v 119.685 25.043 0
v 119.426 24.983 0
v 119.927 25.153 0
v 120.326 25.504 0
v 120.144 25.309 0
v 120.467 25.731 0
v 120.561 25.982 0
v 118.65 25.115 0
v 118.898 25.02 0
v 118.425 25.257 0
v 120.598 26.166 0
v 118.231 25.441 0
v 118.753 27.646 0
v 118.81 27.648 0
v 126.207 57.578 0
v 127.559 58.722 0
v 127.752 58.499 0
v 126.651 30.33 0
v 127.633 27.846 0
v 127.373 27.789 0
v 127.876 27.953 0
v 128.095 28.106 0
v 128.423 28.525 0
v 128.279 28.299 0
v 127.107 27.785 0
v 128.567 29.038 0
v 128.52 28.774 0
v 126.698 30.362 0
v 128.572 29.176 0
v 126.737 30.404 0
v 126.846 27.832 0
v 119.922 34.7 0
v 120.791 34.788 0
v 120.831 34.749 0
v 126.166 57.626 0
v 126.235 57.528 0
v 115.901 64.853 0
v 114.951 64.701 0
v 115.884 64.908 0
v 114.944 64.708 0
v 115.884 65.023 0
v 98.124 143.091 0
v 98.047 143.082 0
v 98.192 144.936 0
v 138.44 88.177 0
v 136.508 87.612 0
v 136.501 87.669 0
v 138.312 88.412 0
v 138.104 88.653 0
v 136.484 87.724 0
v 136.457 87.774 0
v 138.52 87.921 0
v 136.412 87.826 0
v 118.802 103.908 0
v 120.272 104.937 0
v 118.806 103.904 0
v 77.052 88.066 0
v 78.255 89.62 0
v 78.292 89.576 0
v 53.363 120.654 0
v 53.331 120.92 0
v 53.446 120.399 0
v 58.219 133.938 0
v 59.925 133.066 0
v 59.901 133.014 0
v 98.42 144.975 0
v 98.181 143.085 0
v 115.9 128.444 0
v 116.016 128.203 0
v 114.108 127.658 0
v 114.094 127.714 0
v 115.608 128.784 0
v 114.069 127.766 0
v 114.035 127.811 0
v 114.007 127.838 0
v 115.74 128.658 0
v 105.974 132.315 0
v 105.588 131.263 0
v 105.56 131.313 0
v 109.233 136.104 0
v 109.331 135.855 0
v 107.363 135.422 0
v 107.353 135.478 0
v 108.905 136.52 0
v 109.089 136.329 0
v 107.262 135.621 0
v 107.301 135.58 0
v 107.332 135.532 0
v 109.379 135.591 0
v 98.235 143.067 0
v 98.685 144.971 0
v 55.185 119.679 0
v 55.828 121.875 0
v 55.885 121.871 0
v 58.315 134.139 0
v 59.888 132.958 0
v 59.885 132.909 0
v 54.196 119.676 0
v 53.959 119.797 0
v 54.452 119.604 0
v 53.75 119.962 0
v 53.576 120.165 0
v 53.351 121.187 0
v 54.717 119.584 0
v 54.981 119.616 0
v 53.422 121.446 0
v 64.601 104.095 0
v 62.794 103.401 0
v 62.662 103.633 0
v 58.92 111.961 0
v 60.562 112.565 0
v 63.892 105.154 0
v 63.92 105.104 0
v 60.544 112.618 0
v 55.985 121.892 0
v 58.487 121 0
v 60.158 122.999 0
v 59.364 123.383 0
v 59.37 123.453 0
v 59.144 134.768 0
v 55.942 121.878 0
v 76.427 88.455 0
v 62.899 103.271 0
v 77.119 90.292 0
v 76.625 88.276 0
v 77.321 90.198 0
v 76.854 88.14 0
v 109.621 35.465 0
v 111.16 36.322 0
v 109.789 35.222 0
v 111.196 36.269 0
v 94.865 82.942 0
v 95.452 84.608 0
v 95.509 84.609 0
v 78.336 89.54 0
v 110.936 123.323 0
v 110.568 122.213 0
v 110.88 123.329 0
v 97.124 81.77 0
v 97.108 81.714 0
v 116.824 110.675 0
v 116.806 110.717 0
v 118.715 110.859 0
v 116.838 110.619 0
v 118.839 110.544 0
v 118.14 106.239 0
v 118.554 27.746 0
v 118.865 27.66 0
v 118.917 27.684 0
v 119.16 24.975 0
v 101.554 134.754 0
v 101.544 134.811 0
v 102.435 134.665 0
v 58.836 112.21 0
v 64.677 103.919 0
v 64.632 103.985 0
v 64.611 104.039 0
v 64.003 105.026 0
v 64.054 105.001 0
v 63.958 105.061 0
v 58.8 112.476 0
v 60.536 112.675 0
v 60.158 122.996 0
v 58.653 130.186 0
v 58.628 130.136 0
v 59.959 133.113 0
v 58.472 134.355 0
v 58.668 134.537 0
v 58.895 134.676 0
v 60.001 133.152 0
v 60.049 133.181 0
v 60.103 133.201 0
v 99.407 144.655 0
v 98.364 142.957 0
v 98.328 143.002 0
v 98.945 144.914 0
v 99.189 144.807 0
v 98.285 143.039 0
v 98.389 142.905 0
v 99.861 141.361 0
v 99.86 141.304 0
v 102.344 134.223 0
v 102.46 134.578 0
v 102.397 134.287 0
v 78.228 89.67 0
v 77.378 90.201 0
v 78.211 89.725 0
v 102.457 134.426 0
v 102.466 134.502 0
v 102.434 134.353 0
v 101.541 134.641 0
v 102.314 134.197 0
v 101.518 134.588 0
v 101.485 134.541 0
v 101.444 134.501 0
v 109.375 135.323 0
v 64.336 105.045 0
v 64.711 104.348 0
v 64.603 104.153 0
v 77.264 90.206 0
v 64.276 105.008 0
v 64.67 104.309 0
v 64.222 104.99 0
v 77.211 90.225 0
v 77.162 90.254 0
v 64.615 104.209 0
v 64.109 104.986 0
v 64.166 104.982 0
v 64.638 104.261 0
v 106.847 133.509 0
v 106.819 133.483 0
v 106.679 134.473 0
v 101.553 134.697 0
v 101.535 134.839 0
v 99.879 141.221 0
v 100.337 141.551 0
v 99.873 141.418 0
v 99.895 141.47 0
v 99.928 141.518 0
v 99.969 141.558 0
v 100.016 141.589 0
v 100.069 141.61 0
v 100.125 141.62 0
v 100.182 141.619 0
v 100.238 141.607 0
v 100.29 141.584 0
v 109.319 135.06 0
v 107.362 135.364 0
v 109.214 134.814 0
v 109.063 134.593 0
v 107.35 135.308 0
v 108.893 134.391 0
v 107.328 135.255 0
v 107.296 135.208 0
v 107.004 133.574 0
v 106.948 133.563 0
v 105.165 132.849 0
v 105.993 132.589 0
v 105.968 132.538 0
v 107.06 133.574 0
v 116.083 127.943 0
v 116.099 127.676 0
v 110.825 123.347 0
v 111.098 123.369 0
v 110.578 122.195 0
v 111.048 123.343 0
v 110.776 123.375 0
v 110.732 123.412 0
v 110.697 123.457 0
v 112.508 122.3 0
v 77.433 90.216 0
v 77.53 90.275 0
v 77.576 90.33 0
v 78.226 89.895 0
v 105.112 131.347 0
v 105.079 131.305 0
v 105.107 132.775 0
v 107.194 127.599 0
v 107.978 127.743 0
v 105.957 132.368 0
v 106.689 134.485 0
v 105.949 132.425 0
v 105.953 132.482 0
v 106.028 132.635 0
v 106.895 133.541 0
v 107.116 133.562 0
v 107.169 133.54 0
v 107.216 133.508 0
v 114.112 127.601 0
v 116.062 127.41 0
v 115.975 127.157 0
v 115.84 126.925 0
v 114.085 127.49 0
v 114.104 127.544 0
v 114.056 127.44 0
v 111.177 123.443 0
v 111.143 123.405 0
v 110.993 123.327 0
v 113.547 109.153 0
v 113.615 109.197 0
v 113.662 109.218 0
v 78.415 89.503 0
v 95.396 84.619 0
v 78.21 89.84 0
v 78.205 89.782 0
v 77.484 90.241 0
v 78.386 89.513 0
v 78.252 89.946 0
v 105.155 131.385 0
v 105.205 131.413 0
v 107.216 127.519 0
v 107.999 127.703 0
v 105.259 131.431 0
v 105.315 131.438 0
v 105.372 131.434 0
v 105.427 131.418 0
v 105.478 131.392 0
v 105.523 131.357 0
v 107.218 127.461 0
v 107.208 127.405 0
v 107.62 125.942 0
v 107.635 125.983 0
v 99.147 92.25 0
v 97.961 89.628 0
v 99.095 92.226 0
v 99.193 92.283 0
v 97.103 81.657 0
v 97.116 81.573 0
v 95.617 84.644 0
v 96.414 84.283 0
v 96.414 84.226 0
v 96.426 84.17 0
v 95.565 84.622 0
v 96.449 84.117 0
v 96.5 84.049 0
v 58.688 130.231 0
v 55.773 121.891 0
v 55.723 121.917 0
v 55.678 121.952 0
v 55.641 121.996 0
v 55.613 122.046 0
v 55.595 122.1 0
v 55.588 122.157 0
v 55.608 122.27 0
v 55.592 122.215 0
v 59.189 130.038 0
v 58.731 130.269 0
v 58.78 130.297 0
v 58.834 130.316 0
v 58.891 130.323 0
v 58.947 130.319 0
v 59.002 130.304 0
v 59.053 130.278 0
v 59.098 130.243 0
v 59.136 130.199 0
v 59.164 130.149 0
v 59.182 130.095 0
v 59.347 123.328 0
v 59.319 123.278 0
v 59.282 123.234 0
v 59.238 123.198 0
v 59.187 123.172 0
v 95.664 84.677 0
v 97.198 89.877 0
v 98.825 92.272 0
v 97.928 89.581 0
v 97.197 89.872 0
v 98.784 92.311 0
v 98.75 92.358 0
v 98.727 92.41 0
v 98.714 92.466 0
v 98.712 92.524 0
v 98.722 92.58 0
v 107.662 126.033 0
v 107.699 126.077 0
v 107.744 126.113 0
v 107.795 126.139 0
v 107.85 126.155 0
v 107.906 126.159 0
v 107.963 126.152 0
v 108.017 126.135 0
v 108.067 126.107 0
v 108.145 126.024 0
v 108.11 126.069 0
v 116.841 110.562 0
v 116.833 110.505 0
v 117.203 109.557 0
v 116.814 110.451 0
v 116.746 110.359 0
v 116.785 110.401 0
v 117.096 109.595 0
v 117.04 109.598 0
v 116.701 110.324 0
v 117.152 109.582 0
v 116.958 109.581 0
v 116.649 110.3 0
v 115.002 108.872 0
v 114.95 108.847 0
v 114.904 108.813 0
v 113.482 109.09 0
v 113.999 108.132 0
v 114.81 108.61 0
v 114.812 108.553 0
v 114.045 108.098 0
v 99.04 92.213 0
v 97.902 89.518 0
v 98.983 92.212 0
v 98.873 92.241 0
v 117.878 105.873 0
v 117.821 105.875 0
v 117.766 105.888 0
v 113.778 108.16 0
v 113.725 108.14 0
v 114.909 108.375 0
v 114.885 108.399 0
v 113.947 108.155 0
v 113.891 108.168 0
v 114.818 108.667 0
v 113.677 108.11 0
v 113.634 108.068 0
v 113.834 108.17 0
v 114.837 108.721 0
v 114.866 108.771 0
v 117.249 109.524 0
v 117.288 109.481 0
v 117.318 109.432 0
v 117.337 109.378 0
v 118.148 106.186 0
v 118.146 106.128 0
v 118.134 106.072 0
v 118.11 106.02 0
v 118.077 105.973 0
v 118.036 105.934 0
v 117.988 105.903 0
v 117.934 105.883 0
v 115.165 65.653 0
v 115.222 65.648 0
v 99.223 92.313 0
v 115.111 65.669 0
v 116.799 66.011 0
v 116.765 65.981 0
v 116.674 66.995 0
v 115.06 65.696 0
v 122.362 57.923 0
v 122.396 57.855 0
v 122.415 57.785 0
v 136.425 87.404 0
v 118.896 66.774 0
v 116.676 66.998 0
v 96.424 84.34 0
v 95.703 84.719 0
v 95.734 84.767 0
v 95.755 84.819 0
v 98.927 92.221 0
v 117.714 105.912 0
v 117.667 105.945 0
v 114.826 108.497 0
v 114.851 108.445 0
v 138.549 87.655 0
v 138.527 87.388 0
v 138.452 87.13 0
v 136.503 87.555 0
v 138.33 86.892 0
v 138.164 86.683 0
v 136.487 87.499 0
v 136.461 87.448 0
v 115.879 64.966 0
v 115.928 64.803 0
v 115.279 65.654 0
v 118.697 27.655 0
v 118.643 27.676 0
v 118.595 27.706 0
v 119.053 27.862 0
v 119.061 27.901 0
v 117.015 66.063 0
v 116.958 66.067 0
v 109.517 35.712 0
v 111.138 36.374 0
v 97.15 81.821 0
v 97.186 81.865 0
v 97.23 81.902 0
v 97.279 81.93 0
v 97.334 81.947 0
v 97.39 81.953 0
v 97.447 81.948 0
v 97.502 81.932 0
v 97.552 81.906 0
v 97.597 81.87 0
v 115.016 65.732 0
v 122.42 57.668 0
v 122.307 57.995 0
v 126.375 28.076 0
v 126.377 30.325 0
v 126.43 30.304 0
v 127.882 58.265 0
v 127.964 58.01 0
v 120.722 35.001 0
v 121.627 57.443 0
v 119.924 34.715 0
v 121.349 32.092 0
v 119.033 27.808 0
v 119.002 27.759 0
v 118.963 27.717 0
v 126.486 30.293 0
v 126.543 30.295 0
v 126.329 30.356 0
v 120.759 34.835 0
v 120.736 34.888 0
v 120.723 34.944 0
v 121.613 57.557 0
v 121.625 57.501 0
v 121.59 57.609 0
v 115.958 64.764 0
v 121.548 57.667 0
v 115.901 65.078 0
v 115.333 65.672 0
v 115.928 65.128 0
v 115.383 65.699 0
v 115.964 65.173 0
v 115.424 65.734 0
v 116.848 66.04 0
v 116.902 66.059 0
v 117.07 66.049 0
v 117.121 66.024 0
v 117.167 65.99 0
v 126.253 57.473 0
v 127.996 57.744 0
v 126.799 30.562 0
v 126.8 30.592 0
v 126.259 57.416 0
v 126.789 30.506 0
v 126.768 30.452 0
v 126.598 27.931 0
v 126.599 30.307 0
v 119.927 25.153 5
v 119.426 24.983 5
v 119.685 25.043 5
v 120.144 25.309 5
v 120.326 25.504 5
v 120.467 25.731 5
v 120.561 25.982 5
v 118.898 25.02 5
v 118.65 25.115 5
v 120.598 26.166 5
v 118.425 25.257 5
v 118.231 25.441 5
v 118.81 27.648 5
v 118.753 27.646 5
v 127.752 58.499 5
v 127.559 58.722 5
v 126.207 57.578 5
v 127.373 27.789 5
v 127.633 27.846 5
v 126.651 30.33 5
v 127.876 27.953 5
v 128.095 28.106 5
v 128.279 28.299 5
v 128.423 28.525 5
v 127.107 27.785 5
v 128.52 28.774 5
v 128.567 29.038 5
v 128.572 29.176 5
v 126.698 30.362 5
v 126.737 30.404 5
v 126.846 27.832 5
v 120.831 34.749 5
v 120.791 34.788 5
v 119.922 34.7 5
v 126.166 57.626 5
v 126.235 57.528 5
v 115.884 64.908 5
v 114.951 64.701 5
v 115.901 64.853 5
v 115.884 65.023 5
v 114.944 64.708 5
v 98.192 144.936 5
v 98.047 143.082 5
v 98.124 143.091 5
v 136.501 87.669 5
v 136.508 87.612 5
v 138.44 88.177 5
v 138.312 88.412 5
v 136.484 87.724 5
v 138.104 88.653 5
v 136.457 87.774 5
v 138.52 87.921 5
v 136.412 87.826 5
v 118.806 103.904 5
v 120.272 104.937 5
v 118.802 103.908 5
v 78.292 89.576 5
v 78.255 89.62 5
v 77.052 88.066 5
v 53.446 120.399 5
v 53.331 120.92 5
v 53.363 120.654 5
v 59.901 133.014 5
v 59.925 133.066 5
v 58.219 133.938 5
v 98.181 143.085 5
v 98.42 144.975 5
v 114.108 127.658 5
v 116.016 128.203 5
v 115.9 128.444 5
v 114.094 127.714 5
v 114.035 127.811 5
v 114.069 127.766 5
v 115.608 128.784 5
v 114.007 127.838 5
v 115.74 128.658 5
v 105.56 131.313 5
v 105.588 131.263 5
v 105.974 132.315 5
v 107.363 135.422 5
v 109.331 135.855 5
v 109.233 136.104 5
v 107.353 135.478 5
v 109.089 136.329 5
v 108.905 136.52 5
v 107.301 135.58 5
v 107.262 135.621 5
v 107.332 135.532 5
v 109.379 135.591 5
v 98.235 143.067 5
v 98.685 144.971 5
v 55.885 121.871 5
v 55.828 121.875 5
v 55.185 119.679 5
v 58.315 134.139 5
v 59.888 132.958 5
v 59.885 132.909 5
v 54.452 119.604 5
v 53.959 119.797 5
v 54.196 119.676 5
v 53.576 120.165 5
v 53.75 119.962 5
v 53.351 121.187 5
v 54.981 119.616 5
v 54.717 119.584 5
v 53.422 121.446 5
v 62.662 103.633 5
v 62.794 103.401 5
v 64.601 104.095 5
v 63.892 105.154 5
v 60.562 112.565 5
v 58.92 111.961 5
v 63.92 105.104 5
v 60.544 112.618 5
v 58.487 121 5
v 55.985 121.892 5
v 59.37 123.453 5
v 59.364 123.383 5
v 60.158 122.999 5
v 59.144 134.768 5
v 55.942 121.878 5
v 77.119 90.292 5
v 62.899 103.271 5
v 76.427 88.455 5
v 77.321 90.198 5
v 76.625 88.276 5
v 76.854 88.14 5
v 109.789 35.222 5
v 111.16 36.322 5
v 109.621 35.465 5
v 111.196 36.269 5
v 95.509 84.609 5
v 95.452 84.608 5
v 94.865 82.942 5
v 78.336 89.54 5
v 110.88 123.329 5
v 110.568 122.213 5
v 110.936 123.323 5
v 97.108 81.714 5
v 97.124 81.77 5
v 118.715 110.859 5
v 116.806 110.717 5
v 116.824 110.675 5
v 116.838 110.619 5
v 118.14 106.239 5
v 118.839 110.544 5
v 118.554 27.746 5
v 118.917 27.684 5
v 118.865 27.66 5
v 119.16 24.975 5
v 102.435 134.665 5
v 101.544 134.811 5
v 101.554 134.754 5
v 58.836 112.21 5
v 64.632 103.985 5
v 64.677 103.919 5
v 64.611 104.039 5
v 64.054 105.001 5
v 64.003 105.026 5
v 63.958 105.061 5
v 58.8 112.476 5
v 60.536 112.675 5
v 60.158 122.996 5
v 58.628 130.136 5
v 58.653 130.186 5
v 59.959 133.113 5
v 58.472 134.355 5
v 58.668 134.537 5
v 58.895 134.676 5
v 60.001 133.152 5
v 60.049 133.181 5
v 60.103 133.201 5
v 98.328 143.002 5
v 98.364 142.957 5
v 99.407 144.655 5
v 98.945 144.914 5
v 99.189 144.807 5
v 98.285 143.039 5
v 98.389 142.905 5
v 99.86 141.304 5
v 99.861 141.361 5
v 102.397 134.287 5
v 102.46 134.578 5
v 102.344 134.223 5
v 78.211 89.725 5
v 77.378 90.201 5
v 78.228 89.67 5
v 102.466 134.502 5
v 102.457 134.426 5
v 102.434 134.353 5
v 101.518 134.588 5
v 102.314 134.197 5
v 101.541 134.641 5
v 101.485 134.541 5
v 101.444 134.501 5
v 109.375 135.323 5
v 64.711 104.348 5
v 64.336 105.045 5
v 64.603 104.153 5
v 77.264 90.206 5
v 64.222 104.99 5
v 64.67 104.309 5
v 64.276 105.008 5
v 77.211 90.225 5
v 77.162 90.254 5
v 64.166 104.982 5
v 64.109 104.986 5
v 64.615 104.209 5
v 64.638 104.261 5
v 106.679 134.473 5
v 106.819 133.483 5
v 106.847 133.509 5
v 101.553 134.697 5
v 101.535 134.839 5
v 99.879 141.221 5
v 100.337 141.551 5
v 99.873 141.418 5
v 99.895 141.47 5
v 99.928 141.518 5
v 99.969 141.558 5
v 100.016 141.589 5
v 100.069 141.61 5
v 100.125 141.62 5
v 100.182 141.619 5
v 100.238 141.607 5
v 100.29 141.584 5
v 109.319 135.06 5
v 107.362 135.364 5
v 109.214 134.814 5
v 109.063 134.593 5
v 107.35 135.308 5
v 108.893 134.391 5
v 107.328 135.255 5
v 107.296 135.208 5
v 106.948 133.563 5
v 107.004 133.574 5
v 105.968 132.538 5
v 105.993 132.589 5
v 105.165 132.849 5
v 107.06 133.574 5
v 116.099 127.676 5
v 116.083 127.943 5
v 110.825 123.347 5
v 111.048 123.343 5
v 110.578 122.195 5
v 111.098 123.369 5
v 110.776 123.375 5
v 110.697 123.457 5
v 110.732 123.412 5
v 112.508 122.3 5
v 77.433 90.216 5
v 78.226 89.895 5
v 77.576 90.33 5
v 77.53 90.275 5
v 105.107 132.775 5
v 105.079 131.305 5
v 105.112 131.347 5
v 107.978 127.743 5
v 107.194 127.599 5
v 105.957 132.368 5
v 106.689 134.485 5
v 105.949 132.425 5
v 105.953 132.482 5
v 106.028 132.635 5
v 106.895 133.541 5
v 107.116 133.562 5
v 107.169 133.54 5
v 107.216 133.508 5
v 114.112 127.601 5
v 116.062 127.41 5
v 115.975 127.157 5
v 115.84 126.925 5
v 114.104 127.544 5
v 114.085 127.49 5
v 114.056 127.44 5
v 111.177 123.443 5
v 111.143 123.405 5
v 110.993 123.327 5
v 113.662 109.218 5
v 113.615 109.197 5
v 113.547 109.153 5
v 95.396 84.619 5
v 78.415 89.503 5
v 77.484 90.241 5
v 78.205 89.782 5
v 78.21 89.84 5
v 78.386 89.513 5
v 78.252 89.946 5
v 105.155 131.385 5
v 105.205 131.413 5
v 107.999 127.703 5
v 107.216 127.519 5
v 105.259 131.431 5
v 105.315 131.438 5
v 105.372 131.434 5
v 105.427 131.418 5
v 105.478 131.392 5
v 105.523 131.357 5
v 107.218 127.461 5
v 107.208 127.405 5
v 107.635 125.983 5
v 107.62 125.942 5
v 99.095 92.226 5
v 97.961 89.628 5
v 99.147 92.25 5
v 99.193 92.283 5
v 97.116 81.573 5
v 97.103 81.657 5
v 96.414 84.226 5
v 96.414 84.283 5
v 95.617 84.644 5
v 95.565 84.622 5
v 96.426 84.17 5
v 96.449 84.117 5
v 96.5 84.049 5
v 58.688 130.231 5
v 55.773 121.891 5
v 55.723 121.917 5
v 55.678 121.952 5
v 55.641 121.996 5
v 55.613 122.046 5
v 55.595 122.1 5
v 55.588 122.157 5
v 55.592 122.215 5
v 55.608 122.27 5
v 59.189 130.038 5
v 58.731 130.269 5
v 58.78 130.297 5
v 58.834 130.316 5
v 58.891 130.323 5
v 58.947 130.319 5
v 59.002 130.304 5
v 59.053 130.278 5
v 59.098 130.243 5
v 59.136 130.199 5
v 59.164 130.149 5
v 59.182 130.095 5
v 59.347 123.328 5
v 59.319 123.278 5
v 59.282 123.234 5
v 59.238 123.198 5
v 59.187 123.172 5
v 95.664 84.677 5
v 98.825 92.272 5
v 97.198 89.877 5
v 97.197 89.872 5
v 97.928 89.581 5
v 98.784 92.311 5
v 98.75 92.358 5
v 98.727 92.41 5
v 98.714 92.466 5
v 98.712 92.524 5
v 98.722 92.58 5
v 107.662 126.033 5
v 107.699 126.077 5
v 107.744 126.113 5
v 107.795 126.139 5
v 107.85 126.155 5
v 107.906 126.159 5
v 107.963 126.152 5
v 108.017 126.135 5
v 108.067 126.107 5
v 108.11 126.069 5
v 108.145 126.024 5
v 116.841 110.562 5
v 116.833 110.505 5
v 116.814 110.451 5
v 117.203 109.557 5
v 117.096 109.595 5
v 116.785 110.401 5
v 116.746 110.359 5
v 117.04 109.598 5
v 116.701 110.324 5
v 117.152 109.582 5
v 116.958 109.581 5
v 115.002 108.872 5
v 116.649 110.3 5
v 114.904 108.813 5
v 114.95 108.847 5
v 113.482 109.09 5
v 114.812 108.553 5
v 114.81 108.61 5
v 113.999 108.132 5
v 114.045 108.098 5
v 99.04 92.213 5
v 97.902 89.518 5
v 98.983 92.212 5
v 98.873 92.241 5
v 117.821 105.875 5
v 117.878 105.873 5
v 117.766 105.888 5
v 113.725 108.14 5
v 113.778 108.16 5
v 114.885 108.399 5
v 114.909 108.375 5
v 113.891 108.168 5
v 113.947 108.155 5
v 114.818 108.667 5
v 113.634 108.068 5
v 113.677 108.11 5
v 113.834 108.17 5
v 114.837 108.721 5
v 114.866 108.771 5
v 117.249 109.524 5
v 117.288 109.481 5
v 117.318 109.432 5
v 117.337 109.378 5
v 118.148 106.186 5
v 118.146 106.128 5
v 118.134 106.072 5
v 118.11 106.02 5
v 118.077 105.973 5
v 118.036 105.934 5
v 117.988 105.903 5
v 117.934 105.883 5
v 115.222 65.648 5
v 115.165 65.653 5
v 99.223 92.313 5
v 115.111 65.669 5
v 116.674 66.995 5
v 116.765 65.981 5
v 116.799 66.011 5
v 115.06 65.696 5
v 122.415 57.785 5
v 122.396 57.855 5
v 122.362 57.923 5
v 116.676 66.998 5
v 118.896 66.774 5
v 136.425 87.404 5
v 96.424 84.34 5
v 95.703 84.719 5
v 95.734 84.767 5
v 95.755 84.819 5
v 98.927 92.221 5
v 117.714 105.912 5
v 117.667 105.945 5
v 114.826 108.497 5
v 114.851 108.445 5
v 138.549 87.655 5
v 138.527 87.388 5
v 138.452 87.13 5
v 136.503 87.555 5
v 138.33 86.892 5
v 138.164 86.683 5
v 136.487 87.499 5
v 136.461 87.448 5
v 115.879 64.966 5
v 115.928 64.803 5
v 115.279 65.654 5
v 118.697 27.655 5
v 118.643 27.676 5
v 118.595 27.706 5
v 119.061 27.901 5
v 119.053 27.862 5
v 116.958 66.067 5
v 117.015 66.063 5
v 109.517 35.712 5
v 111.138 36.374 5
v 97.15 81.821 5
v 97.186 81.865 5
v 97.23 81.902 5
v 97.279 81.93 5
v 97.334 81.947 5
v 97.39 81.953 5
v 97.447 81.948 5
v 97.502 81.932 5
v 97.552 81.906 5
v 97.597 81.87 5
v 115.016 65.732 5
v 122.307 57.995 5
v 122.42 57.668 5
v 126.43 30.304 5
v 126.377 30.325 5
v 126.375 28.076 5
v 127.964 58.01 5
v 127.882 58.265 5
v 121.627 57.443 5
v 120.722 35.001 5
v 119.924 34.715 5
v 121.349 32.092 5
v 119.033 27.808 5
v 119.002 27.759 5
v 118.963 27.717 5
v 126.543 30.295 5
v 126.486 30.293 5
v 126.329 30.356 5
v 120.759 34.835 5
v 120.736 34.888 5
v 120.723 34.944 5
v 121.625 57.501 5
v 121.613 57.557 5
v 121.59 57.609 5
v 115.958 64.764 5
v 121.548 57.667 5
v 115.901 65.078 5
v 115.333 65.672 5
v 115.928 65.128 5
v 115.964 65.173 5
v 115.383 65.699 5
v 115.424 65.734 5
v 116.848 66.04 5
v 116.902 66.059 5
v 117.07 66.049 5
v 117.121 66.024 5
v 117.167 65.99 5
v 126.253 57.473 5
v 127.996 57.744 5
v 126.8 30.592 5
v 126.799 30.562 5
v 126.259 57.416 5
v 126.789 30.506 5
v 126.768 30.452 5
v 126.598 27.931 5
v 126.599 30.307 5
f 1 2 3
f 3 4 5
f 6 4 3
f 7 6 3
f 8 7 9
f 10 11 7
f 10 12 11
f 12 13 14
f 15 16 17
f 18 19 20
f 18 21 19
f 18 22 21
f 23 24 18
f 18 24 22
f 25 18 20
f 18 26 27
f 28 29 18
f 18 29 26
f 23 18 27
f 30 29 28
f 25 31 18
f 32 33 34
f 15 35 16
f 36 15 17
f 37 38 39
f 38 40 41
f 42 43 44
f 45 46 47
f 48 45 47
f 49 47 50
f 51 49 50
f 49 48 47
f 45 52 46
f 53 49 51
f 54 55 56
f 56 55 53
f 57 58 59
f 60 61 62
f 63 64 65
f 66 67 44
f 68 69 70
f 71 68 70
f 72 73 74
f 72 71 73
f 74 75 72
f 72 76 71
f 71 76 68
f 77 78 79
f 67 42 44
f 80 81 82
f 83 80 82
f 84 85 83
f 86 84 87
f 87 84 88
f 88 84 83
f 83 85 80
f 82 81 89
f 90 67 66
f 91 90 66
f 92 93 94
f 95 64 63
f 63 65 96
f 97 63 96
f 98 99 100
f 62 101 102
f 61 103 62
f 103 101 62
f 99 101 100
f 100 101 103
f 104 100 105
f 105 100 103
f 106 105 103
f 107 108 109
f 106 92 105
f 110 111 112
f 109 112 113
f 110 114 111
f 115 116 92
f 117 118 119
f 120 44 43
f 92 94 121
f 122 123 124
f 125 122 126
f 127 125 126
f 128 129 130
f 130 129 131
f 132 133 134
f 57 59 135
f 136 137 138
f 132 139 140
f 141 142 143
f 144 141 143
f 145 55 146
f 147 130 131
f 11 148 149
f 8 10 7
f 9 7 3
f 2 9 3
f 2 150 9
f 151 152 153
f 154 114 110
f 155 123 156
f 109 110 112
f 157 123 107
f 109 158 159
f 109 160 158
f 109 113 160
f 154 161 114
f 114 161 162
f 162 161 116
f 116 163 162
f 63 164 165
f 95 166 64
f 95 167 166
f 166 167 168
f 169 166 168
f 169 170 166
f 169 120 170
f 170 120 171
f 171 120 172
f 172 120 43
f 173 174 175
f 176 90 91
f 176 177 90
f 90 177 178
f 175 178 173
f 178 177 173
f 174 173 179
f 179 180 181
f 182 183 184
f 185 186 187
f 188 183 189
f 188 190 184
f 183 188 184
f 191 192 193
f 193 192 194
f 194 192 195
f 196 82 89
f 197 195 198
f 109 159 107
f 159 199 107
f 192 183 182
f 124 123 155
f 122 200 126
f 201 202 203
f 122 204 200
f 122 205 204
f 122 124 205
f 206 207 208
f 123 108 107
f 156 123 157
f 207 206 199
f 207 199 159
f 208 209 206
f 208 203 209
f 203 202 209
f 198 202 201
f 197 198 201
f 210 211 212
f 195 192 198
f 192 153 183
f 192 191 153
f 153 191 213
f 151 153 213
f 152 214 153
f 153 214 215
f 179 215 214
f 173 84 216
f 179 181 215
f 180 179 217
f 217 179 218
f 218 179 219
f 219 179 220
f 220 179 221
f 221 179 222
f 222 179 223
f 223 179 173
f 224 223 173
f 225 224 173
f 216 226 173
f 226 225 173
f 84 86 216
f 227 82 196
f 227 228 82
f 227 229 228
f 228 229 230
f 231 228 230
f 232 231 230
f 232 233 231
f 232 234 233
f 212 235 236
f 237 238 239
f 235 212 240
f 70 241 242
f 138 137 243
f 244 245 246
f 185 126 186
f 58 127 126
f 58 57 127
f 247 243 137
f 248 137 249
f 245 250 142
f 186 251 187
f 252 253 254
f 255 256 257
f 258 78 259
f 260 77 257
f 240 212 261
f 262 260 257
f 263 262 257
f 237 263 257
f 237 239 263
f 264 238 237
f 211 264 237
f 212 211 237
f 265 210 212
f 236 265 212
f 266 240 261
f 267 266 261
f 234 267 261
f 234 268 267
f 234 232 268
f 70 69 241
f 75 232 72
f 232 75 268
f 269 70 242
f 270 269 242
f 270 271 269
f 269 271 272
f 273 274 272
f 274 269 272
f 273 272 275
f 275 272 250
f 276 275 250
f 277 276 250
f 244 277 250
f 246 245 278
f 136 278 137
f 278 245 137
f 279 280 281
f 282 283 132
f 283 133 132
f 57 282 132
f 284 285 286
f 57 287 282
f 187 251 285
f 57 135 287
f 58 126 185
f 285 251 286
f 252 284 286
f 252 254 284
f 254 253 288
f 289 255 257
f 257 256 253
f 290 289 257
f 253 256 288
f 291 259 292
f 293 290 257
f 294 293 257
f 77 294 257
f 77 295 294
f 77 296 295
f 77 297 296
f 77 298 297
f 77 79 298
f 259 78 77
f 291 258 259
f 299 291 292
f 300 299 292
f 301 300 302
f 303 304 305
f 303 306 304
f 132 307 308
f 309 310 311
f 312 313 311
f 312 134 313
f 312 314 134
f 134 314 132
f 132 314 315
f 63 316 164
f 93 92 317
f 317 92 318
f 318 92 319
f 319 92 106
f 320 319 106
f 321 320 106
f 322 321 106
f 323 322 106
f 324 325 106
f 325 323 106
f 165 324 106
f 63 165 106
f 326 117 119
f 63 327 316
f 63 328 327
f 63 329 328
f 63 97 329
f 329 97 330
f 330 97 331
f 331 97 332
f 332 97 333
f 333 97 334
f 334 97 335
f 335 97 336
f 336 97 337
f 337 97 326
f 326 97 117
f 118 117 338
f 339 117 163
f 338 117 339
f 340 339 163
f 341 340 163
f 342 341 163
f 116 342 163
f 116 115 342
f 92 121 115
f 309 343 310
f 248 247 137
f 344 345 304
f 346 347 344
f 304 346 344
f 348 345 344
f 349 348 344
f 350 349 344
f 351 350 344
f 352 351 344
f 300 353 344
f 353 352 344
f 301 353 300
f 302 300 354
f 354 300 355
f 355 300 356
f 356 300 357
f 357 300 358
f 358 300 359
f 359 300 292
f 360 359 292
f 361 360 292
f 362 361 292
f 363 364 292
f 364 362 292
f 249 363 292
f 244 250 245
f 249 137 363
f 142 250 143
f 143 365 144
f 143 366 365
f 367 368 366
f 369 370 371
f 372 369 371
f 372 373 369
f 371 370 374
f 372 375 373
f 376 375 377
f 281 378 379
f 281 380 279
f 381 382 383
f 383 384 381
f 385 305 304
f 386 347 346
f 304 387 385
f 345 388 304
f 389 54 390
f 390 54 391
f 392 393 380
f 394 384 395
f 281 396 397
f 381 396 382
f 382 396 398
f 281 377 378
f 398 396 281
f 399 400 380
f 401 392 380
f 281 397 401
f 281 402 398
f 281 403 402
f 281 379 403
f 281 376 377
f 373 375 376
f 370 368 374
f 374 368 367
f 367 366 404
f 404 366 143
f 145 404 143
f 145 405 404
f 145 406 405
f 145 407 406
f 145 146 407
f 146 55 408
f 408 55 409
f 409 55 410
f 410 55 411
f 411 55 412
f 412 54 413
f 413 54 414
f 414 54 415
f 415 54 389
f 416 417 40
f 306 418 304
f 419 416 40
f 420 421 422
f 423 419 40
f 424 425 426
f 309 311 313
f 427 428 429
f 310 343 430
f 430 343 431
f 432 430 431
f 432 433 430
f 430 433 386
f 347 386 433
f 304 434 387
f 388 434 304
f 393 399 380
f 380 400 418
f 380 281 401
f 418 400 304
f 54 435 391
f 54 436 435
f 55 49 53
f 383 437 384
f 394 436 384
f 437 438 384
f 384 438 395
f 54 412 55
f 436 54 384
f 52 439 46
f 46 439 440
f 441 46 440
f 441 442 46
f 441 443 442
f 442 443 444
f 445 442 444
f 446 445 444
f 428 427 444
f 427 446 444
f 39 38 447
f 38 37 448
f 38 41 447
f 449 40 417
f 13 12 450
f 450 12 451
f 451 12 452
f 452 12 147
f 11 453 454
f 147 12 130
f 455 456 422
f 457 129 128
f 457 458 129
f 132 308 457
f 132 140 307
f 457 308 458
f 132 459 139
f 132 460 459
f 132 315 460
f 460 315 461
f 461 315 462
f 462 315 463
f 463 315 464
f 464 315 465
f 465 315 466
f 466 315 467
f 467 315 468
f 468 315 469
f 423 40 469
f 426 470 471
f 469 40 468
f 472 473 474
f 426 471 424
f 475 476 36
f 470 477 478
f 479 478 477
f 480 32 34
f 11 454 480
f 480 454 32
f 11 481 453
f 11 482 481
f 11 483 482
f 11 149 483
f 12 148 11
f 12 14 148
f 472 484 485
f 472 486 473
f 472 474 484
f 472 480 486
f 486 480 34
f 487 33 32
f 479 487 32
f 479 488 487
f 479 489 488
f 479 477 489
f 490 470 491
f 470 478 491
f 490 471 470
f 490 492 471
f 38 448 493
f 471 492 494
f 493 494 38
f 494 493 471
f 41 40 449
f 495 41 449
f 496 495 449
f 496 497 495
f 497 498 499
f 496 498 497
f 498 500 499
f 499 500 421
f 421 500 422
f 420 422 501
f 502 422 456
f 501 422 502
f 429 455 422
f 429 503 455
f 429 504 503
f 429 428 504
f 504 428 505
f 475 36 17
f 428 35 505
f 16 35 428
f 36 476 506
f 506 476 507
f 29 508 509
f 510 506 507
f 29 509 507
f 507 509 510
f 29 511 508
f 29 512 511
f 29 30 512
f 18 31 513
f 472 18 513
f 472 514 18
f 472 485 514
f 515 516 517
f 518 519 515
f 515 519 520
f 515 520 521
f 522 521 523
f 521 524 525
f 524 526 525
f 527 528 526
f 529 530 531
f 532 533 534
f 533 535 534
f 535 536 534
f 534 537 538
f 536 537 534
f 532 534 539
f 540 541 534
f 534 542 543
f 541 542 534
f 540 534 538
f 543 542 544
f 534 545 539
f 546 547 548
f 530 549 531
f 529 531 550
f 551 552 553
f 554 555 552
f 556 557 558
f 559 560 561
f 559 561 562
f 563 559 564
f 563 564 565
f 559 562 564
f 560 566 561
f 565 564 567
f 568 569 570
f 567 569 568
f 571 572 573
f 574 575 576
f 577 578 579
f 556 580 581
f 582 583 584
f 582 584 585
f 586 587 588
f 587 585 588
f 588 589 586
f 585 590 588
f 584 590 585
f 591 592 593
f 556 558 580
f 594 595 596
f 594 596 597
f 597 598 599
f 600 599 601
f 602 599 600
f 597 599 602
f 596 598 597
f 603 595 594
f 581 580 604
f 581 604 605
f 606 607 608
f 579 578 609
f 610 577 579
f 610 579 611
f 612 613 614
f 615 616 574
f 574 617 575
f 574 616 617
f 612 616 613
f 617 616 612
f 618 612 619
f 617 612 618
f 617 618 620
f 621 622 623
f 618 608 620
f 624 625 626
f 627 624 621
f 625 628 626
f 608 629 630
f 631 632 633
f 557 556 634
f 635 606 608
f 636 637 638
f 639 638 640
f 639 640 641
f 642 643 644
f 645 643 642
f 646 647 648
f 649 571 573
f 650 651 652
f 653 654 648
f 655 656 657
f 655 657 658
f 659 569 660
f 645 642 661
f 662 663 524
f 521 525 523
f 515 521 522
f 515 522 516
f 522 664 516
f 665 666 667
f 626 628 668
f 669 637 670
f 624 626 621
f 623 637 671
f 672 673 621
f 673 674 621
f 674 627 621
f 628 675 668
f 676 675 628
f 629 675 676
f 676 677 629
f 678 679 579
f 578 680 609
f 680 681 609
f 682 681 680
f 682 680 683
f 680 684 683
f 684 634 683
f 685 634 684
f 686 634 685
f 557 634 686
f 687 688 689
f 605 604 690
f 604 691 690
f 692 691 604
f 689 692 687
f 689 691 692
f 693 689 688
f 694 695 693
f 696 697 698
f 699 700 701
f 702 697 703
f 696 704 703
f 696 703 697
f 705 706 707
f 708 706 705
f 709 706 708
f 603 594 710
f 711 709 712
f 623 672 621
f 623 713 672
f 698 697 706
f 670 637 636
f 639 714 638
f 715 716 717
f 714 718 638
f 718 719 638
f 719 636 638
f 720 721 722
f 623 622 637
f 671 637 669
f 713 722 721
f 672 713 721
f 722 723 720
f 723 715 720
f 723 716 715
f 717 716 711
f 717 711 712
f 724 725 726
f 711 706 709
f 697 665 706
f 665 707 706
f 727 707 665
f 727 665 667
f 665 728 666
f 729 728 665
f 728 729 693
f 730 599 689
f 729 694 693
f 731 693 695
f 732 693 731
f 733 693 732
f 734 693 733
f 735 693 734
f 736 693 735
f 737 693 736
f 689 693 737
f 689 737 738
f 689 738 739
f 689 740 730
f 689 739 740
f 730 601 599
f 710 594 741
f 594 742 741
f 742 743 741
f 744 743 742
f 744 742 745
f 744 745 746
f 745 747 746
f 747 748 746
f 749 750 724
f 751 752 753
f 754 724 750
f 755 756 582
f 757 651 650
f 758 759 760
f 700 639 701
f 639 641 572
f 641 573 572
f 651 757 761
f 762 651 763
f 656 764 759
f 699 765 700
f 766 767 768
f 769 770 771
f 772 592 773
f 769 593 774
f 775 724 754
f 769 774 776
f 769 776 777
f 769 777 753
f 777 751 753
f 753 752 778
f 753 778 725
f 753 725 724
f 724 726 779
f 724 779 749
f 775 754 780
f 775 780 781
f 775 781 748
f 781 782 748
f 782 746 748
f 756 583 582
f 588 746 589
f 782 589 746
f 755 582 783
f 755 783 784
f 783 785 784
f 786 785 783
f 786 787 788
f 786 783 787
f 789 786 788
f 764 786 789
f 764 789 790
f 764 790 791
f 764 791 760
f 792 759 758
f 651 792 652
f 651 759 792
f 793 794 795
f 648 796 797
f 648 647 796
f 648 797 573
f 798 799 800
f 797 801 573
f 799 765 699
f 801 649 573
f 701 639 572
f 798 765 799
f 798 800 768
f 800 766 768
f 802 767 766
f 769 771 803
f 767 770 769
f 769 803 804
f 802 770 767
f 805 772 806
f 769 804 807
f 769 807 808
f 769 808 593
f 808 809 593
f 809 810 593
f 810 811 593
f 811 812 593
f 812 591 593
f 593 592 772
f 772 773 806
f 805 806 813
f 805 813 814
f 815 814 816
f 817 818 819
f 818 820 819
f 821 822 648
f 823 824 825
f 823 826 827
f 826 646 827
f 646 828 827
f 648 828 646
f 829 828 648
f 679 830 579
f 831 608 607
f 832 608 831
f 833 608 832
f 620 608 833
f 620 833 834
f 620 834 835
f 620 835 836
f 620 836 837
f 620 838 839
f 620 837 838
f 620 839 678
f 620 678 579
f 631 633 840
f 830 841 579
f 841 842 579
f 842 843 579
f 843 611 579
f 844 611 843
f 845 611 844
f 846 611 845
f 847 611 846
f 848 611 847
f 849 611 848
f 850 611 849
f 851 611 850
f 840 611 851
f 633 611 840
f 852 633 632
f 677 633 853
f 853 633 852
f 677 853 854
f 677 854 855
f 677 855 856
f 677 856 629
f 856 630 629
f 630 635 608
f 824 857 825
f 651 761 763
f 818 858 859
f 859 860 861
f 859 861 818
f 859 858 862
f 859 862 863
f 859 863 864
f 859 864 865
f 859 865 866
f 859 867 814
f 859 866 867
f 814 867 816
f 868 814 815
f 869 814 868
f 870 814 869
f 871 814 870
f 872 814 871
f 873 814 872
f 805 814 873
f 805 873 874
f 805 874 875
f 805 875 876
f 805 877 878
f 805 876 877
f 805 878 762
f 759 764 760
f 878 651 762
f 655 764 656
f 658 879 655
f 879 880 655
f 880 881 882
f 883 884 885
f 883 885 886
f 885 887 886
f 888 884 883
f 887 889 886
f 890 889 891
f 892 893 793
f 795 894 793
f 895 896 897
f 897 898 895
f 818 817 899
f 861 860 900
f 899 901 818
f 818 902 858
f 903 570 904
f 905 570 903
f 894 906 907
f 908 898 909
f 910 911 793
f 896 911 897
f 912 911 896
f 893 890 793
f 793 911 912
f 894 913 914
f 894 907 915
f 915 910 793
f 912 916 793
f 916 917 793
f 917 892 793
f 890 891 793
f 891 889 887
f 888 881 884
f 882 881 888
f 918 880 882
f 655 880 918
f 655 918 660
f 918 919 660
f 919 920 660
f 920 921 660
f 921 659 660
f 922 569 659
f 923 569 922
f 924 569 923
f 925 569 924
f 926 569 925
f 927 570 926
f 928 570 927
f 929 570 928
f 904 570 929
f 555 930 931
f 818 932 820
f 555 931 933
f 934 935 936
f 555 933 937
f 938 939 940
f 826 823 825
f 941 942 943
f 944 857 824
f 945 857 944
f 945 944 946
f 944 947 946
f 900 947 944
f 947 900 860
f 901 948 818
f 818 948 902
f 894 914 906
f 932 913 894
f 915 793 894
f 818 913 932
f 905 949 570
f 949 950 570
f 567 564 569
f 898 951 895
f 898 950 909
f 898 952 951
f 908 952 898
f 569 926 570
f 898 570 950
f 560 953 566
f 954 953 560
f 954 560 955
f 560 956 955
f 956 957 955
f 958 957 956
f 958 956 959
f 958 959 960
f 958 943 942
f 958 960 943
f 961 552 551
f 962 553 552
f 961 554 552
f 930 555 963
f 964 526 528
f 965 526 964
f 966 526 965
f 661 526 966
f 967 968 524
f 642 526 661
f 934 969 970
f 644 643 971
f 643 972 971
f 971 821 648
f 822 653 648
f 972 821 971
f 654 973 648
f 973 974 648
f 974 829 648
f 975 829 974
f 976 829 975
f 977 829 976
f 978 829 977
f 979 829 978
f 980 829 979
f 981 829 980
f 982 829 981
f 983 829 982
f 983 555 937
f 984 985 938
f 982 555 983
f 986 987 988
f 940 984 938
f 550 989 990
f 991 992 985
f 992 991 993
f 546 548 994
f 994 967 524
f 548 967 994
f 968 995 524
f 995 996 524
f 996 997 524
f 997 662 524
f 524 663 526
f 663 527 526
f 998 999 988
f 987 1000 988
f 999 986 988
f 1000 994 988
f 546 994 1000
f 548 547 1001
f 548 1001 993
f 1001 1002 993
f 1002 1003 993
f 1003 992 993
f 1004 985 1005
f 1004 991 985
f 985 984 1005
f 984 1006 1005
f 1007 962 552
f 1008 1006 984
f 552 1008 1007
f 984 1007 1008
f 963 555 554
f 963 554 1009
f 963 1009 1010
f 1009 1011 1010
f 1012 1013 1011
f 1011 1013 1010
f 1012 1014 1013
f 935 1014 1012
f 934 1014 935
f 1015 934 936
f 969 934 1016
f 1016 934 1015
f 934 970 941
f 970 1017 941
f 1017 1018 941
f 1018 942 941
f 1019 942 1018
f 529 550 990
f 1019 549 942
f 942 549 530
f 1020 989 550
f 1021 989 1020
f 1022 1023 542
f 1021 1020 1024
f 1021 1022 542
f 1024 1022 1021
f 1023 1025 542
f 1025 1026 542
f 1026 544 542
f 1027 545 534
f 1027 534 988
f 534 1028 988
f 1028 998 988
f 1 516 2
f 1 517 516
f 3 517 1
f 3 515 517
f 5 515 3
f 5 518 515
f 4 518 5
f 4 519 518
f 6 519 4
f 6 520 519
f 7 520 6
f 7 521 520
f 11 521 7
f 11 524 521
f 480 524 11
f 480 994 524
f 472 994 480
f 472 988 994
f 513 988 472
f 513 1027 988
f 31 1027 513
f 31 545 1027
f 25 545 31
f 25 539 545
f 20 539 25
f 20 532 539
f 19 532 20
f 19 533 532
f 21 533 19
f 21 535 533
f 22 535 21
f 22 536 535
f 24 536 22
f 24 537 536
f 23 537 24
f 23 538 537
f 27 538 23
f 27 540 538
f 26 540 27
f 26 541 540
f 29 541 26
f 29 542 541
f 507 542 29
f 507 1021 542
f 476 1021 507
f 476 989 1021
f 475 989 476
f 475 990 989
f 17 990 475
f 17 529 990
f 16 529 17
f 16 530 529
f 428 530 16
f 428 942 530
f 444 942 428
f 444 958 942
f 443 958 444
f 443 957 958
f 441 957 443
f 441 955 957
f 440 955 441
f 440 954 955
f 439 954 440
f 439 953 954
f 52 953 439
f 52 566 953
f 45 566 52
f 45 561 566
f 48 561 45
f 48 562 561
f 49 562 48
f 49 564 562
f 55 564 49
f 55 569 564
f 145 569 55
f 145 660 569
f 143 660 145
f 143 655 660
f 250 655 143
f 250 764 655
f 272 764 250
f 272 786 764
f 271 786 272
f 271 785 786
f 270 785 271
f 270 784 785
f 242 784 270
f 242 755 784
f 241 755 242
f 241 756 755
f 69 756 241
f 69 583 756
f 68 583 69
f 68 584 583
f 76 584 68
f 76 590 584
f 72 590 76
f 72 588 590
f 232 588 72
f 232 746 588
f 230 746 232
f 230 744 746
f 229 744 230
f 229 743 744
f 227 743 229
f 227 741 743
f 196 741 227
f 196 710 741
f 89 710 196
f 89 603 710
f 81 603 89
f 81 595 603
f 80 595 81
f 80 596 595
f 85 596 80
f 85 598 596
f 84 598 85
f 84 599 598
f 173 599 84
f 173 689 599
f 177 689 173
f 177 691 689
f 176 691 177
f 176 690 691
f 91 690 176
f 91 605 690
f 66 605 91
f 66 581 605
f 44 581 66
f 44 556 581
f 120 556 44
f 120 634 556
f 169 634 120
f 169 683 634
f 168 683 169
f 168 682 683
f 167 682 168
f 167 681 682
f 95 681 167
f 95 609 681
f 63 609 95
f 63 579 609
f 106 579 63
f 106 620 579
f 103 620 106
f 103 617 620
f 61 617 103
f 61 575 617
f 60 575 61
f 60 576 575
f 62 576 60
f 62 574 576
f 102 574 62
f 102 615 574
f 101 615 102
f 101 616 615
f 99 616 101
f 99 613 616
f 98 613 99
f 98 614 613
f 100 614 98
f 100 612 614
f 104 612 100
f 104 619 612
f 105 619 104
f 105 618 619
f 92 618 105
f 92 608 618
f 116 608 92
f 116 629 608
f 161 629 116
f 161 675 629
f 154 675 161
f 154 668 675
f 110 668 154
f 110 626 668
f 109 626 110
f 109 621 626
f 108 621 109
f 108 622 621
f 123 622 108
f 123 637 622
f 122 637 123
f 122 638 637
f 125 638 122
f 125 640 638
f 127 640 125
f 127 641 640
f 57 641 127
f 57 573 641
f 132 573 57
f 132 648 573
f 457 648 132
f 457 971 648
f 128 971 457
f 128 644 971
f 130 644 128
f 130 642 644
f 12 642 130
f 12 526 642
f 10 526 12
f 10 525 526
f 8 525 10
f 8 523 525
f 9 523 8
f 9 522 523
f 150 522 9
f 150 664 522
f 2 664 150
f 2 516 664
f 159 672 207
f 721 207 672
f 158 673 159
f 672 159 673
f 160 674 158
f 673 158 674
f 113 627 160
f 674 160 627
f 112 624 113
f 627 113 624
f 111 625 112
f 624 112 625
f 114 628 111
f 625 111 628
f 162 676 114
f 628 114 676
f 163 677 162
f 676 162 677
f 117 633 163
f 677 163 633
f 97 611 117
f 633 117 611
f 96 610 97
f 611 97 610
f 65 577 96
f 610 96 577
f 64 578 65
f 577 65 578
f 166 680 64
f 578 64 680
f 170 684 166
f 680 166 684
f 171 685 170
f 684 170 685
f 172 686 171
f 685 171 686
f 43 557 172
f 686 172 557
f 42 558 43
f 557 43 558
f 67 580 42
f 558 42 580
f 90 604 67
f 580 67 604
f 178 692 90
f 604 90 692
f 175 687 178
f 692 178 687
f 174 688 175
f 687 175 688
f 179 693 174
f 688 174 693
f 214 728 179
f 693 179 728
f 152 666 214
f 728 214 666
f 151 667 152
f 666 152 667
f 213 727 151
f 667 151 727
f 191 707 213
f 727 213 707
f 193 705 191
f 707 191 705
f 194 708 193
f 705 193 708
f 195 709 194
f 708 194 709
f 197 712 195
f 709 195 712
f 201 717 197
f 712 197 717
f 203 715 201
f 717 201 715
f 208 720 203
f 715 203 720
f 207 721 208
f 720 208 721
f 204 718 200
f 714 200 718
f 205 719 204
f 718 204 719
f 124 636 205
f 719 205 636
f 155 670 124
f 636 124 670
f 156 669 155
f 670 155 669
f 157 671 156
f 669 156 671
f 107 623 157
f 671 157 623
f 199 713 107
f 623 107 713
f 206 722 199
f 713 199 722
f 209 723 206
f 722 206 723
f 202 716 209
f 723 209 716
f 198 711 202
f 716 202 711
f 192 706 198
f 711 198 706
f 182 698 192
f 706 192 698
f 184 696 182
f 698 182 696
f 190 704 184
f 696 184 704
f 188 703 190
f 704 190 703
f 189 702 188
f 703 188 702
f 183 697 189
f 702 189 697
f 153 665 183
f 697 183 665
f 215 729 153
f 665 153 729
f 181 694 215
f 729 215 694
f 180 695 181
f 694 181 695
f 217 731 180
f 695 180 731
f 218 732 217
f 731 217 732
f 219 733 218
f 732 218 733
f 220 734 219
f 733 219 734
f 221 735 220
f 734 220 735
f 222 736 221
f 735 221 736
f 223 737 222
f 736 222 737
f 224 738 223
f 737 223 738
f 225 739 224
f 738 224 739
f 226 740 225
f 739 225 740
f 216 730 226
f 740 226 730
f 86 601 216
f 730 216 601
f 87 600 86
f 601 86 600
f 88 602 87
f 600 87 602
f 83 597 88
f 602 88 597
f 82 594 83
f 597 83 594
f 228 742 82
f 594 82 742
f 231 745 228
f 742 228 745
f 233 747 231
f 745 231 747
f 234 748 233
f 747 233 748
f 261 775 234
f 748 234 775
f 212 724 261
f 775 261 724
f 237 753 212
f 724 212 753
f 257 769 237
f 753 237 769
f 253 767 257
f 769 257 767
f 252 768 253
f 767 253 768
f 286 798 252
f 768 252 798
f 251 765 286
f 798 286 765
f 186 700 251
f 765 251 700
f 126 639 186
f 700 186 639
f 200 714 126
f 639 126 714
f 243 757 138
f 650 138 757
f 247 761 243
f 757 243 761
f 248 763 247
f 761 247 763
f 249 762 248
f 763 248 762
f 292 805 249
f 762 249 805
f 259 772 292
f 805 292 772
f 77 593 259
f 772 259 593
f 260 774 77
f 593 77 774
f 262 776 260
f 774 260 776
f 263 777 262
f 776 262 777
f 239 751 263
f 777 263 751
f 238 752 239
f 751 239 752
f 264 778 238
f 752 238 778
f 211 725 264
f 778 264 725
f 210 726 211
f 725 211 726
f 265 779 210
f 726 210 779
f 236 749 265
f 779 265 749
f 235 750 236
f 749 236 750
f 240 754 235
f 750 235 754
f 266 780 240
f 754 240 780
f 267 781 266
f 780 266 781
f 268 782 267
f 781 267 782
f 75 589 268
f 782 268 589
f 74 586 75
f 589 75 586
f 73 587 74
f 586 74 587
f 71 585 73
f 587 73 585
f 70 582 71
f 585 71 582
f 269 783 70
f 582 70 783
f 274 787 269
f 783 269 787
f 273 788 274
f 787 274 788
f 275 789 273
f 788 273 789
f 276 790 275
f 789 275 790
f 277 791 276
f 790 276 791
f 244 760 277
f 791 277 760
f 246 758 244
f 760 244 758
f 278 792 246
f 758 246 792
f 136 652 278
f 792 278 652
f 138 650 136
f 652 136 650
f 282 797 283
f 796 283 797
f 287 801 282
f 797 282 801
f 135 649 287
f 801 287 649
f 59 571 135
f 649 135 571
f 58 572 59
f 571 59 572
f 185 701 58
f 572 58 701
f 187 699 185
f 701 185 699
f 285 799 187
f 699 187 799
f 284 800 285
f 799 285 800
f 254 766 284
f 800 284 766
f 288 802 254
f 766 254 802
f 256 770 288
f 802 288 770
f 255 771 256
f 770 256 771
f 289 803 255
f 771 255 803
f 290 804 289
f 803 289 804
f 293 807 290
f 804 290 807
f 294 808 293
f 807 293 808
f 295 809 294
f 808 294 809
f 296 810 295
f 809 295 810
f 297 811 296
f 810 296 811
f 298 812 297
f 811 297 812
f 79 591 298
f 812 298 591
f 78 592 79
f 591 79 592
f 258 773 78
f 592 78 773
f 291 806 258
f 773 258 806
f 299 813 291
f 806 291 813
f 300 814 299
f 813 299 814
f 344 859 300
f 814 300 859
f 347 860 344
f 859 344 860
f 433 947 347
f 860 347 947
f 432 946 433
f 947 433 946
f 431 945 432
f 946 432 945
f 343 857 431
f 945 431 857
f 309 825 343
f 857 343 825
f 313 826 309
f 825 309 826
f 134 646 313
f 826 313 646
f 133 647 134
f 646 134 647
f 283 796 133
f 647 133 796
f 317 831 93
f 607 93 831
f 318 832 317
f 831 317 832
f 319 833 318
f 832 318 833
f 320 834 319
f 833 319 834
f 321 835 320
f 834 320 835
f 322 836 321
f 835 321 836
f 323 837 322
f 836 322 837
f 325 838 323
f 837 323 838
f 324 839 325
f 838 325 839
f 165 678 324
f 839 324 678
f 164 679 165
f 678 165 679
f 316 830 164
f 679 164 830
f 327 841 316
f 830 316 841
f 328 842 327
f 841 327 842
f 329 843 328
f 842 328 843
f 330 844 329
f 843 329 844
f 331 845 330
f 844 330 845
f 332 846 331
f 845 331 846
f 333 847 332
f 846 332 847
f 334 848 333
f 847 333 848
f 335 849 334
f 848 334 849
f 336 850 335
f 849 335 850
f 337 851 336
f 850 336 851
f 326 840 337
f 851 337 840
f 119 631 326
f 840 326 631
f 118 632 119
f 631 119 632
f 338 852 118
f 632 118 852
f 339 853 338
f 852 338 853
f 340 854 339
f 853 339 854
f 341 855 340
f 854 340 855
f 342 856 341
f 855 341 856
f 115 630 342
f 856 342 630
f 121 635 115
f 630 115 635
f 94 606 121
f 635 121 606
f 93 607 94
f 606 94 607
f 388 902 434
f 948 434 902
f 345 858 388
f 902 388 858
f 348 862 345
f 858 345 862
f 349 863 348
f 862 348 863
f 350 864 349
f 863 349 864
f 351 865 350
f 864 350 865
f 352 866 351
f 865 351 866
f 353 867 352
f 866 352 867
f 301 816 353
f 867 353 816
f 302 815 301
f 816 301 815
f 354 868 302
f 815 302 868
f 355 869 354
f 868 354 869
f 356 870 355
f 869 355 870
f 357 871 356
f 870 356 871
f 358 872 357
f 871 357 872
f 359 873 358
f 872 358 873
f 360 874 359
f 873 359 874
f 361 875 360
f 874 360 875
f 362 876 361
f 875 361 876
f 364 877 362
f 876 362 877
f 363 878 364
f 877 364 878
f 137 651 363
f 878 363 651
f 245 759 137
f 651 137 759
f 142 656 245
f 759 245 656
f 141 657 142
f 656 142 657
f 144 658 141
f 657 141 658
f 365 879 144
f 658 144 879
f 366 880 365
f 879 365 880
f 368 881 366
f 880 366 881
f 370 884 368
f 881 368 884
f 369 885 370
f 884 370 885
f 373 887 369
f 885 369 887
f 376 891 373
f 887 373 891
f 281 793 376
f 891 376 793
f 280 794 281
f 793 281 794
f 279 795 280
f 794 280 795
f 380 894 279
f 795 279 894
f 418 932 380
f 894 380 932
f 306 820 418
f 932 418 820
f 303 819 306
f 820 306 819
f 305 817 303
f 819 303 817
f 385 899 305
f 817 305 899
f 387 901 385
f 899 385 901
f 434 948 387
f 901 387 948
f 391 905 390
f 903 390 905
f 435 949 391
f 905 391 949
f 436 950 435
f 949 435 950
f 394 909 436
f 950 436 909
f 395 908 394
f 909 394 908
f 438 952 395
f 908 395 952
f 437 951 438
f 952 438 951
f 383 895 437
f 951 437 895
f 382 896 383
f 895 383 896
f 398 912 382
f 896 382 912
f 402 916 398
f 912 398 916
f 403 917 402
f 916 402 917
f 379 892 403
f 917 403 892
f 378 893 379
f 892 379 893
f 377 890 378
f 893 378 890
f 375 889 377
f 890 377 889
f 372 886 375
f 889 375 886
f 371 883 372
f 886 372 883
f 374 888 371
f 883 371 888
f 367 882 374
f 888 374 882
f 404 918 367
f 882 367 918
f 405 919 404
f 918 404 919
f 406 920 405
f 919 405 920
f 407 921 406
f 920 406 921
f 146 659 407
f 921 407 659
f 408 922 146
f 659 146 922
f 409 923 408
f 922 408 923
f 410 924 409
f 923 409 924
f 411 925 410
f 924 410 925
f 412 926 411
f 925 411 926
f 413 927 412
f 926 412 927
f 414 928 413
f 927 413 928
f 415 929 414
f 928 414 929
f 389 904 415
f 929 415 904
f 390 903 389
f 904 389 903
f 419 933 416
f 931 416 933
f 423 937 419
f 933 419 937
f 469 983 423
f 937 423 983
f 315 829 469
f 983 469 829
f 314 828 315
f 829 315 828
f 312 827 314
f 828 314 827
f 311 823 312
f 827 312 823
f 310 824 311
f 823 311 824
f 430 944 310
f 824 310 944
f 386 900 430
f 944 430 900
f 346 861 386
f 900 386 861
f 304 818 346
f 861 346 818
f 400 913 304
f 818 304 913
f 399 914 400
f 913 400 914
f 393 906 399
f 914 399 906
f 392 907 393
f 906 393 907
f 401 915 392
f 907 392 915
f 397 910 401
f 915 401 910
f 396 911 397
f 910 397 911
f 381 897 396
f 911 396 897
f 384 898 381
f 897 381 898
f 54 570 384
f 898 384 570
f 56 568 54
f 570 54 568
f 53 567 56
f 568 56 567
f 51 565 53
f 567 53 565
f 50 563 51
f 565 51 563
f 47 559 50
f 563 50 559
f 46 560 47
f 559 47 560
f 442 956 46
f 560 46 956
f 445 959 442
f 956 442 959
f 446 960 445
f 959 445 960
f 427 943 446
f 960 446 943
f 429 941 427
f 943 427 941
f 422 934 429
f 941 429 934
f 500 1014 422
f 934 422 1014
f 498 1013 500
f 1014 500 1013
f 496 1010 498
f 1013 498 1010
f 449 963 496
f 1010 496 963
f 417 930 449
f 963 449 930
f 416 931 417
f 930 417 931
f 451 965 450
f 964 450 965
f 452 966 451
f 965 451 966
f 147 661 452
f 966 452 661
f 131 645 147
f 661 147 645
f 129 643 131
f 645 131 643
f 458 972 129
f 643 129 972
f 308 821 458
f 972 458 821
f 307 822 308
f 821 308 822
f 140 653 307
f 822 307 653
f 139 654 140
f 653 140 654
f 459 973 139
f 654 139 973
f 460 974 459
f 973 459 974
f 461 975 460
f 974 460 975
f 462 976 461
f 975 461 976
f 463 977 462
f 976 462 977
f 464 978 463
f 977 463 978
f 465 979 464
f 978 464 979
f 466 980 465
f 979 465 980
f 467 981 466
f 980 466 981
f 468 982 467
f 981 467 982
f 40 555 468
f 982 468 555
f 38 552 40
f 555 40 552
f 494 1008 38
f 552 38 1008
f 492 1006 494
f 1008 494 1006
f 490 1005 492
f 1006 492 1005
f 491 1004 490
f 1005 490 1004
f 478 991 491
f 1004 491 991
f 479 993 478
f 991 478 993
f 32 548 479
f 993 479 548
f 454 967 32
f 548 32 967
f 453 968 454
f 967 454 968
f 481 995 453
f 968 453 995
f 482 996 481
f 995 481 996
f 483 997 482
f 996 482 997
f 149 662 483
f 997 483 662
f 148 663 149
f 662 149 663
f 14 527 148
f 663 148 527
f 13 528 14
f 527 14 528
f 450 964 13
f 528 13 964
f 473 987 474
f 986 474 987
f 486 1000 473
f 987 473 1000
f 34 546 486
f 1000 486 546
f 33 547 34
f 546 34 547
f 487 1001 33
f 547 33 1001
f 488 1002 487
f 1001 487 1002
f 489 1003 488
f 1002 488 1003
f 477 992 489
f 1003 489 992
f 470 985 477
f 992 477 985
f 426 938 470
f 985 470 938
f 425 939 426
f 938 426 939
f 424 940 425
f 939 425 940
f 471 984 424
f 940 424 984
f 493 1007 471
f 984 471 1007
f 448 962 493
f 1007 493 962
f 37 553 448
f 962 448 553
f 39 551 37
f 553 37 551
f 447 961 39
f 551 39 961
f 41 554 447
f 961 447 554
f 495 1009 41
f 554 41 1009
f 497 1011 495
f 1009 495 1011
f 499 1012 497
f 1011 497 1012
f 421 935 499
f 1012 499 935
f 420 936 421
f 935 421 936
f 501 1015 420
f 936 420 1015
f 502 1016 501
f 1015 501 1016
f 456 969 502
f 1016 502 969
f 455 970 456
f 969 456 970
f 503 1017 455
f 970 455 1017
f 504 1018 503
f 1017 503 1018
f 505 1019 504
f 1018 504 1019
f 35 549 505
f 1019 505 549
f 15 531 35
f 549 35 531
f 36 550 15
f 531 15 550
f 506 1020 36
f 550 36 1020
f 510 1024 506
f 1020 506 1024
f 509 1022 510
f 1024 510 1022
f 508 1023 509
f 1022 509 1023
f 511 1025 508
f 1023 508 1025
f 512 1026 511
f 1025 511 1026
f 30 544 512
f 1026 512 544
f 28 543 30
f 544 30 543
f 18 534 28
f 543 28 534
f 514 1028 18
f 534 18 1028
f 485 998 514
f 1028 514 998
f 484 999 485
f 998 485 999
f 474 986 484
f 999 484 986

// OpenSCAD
/*
 * Customizable Origami - Sitting Bunny - https://www.thingiverse.com/thing:2705044
 * by Dennis Hofmann - https://www.thingiverse.com/mightynozzle/about
 * created 2017-12-11
 * version v1.0
 *
 * Changelog
 * --------------
 * v1.0:
 *      - final design
 * --------------
 * 
 * This work is licensed under the Creative Commons - Attribution - NonCommercial - ShareAlike license.
 * https://creativecommons.org/licenses/by-nc-sa/3.0/
 */


 // Parameter Section //
//-------------------//

// preview[view:north, tilt:top]

// The maximum size of the longest side. The shorter side will be automatically resized in same ratio.
max_size_in_millimeter = 120; //[20:300]

// The height of the model.
model_height_in_millimeter = 5; //[0.2:0.2:100]

// Thickness of the outer outline.
outline_size_in_millimeter = 1.8; //[0.5:0.1:20]

// Thickness of the inner outline.
inline_size_in_millimeter = 0.8; //[0.5:0.1:20]

// Roundiness of the ends of the inner outlines.
inline_edge_radius_in_millimeter = 0.3; //[0.0:0.1:5]

// Flip model
flip_model = "no"; //[yes,no]

/*[hidden]*/
max_size = max_size_in_millimeter;
model_height = model_height_in_millimeter;
$fn=32;

// Outer Points
A1 = [570, 1249];
A2 = [623, 1270];
A3 = [627, 1162];
A4 = [666, 1076];
A5 = [807, 923];
A6 = [1000, 868];
A7 = [1155, 373];
A8 = [1243, 272];
A9 = [1254, 358];
A10 = [1326, 301];
A11 = [1320, 596];
A12 = [1219, 689];
A13 = [1430, 905];
A14 = [1241, 1076];
A15 = [1225, 1138];
A16 = [1156, 1264];
A17 = [1196, 1319];
A18 = [1115, 1386];
A19 = [1126, 1399];
A20 = [1027, 1483];
A21 = [620, 1378];

outline = [A1, A2, A3, A4, A5, A6, A7, A8, A9, A10, A11, A12, A13, A14, A15, A16, A17, A18, A19, A20, A21];

// Inner Points
B1 = [1064, 1389];
B2 = [1099, 1369];
B3 = [1122, 1317];
B4 = [1186, 1124];
B5 = [1017, 927];
B6 = [1272, 596];
B7 = [1201, 671];

// Polygons
C1 = [A6, A7, A8, A9, B6, B7];
C2 = [A9, A10, A11, A12, B7, B6];
C3 = [A6, B5, B4, A14, A13, A12, B7];
C4 = [B4, A14, A15];
C5 = [B4, B5, B3, A16, A15];
C6 = [A16, A17, A18, B2, B3];
C7 = [A19, A20, B1, A4, A5, B2, A18];
C8 = [A5, A6, B5, B3, B2];
C9 = [A4, B1, A20, A21, A2, A3];
C10 = [A2, A1, A21];

cut_polygons = [C1, C2, C3, C4, C5, C6, C7, C8, C9, C10];

min_x = A1[0];
min_y = A8[1];
max_x = A13[0];
max_y = A20[1];

x_size = max_x - min_x;
y_size = max_y - min_y;

x_factor = max_size / x_size;
y_factor = max_size / y_size;

inline_size = x_size > y_size ? inline_size_in_millimeter / x_factor / 2: inline_size_in_millimeter / y_factor / 2;
inline_edge_radius = x_size > y_size ? inline_edge_radius_in_millimeter / x_factor: inline_edge_radius_in_millimeter / y_factor;
outline_size = x_size > y_size ? outline_size_in_millimeter / x_factor - inline_size: outline_size_in_millimeter / y_factor - inline_size;


 // Program Section //
//-----------------//

if(x_size > y_size) {
    resize(newsize=[max_size, x_factor * y_size, model_height]){
        if(flip_model == "yes") {
            mirror([0,1,0]) {
                rotate([180,180,0]) {    
                    create(outline, cut_polygons);
                }
            }
        } else {
            create(outline, cut_polygons);
        }
    }
} else {
    resize(newsize=[y_factor * x_size, max_size, model_height]){
        if(flip_model == "yes") {
            mirror([0,1,0]) {
                rotate([180,180,0]) {    
                    create(outline, cut_polygons);
                }
            }
        } else {
            create(outline, cut_polygons);
        }
    }
}


 // Module Section //
//----------------//

module create() {
    linear_extrude(height=1) {
        difference() {
            offset(r = -0) {
                offset(r = +outline_size) {
                    polygon(points = outline, convexity = 10);
                }
            }
            
            for(cut_polygon = [0:len(cut_polygons)]) {
                offset(r = +inline_edge_radius) {
                    offset(r = -inline_size - inline_edge_radius) {
                        polygon(points = cut_polygons[cut_polygon], convexity = 10);
                    }
                }
            }
        }
    }
}
